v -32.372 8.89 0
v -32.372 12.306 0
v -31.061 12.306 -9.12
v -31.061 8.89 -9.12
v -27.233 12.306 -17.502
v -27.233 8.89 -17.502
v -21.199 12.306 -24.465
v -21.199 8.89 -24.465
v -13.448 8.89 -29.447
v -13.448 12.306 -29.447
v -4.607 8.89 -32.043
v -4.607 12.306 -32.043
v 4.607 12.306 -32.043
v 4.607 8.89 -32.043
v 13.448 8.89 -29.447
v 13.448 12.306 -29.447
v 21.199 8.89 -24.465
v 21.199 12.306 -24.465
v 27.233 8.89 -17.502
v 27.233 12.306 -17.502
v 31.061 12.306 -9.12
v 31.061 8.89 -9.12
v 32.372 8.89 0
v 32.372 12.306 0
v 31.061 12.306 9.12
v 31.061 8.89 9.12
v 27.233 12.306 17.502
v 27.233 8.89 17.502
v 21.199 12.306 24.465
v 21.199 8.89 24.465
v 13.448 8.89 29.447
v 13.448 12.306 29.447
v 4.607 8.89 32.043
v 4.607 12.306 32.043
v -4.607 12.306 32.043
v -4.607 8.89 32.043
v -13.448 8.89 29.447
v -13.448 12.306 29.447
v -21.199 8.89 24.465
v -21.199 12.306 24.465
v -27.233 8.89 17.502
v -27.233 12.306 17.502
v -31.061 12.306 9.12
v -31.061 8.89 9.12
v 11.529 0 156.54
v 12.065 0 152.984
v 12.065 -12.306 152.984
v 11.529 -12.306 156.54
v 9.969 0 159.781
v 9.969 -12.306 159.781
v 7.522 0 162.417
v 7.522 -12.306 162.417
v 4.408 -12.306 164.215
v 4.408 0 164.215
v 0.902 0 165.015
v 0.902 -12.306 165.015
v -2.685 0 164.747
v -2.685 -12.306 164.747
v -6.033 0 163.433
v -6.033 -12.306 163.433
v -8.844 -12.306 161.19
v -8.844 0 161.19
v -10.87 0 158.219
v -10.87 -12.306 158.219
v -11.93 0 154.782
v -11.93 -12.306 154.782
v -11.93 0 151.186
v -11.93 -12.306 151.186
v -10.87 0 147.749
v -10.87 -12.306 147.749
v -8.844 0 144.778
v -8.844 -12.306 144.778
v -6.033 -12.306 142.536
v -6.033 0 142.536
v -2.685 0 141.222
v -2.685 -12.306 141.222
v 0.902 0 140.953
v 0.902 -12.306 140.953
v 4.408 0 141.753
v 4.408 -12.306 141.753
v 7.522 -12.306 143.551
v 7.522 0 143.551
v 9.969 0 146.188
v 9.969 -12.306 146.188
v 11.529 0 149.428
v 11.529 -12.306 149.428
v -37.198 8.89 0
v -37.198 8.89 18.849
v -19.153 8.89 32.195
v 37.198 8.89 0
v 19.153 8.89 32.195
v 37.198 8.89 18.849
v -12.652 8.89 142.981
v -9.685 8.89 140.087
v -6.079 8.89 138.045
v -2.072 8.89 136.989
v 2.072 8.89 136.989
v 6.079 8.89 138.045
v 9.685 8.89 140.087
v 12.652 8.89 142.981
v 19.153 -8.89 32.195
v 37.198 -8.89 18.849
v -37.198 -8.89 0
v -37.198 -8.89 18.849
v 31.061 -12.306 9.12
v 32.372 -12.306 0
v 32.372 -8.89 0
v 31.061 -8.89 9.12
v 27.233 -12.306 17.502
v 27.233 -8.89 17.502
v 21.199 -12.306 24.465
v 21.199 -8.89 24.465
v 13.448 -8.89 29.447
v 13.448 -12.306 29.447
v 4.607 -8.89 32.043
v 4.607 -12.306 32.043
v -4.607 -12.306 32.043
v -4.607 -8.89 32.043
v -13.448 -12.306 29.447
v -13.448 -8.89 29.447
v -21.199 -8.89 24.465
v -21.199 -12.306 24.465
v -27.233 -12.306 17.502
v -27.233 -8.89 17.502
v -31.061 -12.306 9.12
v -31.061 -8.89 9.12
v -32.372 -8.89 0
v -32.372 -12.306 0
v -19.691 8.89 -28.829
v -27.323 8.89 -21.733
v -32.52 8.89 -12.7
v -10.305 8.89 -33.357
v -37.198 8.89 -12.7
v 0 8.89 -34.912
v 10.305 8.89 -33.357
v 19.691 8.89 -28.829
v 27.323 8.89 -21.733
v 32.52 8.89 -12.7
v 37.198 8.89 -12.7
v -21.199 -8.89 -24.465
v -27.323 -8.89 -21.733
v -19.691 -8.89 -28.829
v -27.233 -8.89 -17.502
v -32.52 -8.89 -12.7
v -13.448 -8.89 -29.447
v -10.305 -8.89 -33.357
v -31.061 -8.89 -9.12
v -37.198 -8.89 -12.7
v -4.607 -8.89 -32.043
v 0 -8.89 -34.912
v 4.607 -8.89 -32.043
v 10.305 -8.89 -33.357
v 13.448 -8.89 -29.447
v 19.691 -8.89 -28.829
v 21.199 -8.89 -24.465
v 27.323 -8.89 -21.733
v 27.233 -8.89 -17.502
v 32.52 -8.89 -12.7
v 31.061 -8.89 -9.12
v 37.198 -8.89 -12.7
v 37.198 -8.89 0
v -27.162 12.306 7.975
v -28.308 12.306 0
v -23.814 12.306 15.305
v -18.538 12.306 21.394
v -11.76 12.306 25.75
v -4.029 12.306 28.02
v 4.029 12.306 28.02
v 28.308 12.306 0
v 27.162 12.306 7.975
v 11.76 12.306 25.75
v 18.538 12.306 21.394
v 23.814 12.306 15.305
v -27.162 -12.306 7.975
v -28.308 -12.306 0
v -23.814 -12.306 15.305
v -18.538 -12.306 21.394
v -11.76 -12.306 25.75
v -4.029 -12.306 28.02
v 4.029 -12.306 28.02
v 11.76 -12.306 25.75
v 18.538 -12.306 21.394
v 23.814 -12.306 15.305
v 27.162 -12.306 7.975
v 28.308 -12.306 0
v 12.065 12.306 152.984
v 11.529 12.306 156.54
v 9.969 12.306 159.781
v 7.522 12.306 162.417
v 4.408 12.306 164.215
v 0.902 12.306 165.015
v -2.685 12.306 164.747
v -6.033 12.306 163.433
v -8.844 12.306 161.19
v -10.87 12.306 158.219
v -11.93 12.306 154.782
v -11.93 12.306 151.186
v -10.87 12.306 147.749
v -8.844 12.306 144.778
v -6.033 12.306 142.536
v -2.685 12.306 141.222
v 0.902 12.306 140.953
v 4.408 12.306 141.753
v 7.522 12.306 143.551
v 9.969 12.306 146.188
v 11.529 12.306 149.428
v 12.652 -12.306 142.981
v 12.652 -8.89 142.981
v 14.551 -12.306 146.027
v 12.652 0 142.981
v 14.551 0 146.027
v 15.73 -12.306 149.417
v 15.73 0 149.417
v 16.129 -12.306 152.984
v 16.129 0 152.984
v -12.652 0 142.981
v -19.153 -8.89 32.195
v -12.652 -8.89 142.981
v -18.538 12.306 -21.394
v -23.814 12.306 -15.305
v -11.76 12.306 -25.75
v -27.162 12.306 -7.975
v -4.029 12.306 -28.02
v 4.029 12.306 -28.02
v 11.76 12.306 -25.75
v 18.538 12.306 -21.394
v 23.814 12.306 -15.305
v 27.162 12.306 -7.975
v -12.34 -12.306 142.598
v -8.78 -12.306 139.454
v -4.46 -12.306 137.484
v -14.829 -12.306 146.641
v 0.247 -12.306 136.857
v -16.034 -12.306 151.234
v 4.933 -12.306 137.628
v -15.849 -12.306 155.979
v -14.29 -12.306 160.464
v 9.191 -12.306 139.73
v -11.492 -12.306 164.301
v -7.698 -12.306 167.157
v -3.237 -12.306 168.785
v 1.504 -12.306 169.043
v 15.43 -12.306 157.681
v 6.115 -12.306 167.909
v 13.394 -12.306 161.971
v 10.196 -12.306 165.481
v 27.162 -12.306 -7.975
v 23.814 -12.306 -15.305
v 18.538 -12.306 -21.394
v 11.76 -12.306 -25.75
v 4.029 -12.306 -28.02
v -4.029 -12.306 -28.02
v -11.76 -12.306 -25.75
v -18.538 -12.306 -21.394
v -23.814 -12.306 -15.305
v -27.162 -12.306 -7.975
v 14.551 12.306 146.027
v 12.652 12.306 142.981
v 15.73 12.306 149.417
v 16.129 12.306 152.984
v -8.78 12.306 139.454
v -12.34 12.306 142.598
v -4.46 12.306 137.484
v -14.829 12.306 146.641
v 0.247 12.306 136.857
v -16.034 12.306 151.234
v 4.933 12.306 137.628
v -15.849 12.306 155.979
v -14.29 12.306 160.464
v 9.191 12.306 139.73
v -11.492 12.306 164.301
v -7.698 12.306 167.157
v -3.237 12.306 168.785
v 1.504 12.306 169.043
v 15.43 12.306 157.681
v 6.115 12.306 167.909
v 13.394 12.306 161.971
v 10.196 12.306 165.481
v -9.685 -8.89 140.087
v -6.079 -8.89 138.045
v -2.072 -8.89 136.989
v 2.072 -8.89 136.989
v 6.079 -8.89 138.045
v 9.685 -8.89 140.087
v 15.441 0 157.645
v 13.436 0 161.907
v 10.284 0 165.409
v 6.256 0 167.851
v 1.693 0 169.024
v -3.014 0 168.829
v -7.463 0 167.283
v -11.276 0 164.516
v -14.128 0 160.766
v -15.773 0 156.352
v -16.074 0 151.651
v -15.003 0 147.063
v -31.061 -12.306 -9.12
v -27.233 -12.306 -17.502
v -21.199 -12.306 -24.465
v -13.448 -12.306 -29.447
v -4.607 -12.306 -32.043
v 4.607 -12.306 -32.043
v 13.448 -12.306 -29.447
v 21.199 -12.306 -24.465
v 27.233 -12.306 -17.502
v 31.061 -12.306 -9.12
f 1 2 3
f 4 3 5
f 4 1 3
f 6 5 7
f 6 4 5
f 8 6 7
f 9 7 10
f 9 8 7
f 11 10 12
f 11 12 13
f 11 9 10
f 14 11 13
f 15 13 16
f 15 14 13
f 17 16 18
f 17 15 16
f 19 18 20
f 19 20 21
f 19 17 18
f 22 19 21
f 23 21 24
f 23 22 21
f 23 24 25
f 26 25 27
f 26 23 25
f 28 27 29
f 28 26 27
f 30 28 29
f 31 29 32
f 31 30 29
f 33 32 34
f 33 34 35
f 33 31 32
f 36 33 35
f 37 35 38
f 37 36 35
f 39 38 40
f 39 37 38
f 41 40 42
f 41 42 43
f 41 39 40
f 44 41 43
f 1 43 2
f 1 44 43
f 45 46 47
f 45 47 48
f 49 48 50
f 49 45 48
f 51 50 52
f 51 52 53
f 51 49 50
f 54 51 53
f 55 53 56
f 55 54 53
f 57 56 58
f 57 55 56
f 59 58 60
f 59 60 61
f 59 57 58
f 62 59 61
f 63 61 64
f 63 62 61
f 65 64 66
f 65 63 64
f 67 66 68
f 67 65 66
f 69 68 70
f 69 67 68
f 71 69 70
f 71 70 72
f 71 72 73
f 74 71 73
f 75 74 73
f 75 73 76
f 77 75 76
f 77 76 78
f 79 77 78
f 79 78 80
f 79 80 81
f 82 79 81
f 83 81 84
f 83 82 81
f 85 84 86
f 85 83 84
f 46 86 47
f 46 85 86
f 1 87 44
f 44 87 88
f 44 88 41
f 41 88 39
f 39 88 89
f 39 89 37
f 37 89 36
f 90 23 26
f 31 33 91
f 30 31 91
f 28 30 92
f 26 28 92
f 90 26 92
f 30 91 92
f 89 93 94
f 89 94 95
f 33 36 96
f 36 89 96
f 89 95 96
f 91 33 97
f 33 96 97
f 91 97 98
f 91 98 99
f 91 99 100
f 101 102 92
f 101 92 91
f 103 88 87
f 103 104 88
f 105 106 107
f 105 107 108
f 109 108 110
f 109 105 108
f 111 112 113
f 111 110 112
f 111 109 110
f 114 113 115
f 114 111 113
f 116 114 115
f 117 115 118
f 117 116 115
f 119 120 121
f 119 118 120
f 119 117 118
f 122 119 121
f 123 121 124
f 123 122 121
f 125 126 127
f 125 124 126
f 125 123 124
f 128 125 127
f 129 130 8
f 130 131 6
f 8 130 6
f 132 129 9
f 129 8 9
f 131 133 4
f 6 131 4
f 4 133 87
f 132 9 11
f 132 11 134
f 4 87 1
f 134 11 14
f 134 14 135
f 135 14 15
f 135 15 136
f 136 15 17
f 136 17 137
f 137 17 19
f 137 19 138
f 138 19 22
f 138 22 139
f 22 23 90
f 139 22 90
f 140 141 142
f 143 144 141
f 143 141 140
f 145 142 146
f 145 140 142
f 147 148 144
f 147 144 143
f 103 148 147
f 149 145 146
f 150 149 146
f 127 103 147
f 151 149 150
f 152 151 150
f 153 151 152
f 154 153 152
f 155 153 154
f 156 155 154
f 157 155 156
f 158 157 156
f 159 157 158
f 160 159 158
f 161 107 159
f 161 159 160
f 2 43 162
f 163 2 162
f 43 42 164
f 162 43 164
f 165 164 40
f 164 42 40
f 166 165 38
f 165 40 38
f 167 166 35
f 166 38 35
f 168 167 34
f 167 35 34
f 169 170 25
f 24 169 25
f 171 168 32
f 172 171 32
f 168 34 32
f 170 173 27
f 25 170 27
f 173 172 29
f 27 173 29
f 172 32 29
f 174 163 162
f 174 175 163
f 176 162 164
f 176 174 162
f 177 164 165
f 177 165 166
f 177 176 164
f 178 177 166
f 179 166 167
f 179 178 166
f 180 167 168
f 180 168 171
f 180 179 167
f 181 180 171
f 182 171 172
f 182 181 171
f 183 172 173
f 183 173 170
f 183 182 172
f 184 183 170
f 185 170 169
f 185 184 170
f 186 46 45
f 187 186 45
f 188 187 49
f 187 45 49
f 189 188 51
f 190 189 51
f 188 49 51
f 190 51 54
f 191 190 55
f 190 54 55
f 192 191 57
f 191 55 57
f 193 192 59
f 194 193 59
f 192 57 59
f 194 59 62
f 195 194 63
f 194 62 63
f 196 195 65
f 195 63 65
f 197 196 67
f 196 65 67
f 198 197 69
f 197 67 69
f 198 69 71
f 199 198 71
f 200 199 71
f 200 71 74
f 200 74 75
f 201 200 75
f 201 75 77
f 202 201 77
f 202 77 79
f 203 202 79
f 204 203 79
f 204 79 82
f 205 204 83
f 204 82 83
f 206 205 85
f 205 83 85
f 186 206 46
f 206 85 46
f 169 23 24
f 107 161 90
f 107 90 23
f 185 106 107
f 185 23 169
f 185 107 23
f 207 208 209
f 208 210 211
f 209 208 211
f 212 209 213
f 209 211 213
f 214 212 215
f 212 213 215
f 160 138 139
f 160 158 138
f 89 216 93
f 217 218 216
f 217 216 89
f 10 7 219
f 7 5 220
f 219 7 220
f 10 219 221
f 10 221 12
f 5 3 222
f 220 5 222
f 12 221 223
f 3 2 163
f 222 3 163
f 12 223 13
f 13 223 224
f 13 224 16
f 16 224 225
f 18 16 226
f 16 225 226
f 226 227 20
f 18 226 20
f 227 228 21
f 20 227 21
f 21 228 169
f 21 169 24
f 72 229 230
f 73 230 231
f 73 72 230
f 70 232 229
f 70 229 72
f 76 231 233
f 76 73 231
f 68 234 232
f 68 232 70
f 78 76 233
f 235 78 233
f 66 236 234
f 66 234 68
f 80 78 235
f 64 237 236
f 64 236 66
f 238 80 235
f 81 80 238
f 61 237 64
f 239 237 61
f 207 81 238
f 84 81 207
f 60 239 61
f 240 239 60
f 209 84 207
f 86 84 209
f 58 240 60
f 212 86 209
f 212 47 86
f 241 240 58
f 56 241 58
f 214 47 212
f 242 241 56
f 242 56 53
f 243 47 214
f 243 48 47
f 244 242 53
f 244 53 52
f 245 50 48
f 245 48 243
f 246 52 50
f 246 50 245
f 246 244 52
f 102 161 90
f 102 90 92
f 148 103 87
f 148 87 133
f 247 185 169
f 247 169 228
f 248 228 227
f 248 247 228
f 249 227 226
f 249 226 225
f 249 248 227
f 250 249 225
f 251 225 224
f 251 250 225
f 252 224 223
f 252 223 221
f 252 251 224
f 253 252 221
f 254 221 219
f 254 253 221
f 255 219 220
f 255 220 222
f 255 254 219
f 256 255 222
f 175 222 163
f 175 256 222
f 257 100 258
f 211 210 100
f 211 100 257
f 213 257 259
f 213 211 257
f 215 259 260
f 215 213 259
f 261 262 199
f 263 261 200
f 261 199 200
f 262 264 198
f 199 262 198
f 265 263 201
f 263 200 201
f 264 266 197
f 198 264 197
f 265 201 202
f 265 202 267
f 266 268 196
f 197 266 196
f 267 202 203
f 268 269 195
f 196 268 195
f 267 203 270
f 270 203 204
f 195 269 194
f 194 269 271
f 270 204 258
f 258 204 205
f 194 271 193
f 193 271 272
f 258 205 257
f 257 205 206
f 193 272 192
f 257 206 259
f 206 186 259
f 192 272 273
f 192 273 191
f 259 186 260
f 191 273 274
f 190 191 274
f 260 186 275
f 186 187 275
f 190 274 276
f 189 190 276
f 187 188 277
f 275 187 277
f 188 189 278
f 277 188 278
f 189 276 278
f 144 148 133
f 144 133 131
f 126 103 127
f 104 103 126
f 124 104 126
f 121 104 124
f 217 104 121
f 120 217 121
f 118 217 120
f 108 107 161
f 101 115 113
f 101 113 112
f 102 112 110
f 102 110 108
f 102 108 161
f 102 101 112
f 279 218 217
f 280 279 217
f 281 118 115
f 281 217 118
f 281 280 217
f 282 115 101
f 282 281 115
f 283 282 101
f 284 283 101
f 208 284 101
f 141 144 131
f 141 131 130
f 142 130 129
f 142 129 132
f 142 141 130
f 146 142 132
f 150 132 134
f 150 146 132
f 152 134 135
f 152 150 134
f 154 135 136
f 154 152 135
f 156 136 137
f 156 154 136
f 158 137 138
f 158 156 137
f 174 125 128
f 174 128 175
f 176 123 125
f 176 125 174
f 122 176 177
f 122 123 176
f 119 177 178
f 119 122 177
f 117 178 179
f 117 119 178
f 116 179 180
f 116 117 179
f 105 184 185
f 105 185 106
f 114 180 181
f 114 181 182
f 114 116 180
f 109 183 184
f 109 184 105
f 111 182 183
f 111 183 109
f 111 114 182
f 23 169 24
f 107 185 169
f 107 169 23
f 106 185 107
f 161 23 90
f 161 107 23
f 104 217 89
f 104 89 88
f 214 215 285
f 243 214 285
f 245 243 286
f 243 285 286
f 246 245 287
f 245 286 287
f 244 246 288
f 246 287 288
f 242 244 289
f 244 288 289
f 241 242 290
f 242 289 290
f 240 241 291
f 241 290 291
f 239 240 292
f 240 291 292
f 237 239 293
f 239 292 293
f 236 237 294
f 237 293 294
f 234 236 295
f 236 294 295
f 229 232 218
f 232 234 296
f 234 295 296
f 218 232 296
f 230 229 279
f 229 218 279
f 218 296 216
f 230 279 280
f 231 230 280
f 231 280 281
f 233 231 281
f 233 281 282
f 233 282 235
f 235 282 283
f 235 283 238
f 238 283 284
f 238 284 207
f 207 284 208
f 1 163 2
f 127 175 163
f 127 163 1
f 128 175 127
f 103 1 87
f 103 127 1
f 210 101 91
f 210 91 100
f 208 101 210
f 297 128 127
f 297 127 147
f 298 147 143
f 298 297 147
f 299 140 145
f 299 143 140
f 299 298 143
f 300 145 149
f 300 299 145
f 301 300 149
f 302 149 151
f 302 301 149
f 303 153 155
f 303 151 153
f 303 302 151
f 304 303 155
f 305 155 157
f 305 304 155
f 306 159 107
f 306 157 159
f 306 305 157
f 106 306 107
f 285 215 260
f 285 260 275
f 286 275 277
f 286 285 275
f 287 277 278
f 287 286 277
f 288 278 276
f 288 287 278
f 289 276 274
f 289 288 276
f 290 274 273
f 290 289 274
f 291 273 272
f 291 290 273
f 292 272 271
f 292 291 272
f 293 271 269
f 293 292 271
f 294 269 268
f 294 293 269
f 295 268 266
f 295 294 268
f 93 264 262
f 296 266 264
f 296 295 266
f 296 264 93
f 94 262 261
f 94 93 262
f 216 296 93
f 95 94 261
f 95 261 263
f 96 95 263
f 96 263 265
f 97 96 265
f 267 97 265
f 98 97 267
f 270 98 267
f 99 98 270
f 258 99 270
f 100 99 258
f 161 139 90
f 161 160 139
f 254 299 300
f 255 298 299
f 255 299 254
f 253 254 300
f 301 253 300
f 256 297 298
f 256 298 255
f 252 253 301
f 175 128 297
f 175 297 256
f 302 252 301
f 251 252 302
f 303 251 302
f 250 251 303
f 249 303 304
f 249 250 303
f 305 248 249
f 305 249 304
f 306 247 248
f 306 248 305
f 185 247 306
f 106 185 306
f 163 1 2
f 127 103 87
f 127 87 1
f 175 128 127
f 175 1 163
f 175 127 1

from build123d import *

# Parameters (mm, degrees)
F1_DEPTH = 12.3063
F2_DEPTH = 8.89
F0_R     = 12.065
F3_DEPTH = 12.3063
F4_DEPTH = 12.3063
F5_DEPTH = 8.89


with BuildPart() as f1:
    # F0 (on Front) → F1 (new body, symmetric)
    with BuildSketch(Plane.XZ):
        with BuildLine():
            ThreePointArc((-28.3083, 0), (0, 28.3083), (28.3083, 0))
            Line((28.3083, 0), (32.3723, 0))
            ThreePointArc((32.3723, 0), (0, 32.3723), (-32.3723, 0))
            Line((-32.3723, 0), (-28.3083, 0))
        make_face()
    extrude(amount=F1_DEPTH, both=True)

    # F0 (on Front) → F2 (join, symmetric)
    with BuildSketch(Plane.XZ):
        with BuildLine():
            ThreePointArc((-32.3723, 0), (0, 32.3723), (32.3723, 0))
            Line((32.3723, 0), (37.1983, 0))
            Line((37.1983, 0), (37.1983, 18.8489910215))
            Line((37.1983, 18.8489910215), (19.1531982273, 32.195366919))
            Line((19.1531982273, 32.195366919), (12.6520330329, 142.9806655679))
            ThreePointArc((12.6520330329, 142.9806655679), (0, 136.8552), (-12.6520330329, 142.9806655679))
            Line((-12.6520330329, 142.9806655679), (-19.1531982273, 32.195366919))
            Line((-19.1531982273, 32.195366919), (-37.1983, 18.8489910215))
            Line((-37.1983, 18.8489910215), (-37.1983, 0))
            Line((-37.1983, 0), (-32.3723, 0))
        make_face()
    extrude(amount=F2_DEPTH, both=True)

    # F0 (on Front) → F3 (join, symmetric)
    with BuildSketch(Plane.XZ):
        with BuildLine():
            ThreePointArc((-12.6520330329, 142.9806655679), (0, 136.8552), (12.6520330329, 142.9806655679))
            ThreePointArc((12.6520330329, 142.9806655679), (15.2349808301, 147.6889190721), (16.129, 152.9842))
            ThreePointArc((16.129, 152.9842), (-5.2952809279, 168.2191808301), (-12.6520330329, 142.9806655679))
        make_face()
        with Locations((0, 152.9842)):
            Circle(F0_R, mode=Mode.SUBTRACT)
    extrude(amount=F3_DEPTH, both=True)


with BuildPart() as f4:
    # F0 (on Front) → F4 (new body, symmetric)
    with BuildSketch(Plane.XZ):
        with BuildLine():
            Line((32.3723, 0), (28.3083, 0))
            ThreePointArc((28.3083, 0), (0, -28.3083), (-28.3083, 0))
            Line((-28.3083, 0), (-32.3723, 0))
            ThreePointArc((-32.3723, 0), (0, -32.3723), (32.3723, 0))
        make_face()
    extrude(amount=F4_DEPTH, both=True)

    # F0 (on Front) → F5 (join, symmetric)
    with BuildSketch(Plane.XZ):
        with BuildLine():
            Line((37.1983, 0), (32.3723, 0))
            ThreePointArc((32.3723, 0), (0, -32.3723), (-32.3723, 0))
            Line((-32.3723, 0), (-37.1983, 0))
            Line((-37.1983, 0), (-37.1983, -12.7))
            Line((-37.1983, -12.7), (-32.52043498, -12.7))
            ThreePointArc((-32.52043498, -12.7), (0, -34.9123), (32.52043498, -12.7))
            Line((32.52043498, -12.7), (37.1983, -12.7))
            Line((37.1983, -12.7), (37.1983, 0))
        make_face()
    extrude(amount=F5_DEPTH, both=True)


solid = Compound([f1.part, f4.part])
